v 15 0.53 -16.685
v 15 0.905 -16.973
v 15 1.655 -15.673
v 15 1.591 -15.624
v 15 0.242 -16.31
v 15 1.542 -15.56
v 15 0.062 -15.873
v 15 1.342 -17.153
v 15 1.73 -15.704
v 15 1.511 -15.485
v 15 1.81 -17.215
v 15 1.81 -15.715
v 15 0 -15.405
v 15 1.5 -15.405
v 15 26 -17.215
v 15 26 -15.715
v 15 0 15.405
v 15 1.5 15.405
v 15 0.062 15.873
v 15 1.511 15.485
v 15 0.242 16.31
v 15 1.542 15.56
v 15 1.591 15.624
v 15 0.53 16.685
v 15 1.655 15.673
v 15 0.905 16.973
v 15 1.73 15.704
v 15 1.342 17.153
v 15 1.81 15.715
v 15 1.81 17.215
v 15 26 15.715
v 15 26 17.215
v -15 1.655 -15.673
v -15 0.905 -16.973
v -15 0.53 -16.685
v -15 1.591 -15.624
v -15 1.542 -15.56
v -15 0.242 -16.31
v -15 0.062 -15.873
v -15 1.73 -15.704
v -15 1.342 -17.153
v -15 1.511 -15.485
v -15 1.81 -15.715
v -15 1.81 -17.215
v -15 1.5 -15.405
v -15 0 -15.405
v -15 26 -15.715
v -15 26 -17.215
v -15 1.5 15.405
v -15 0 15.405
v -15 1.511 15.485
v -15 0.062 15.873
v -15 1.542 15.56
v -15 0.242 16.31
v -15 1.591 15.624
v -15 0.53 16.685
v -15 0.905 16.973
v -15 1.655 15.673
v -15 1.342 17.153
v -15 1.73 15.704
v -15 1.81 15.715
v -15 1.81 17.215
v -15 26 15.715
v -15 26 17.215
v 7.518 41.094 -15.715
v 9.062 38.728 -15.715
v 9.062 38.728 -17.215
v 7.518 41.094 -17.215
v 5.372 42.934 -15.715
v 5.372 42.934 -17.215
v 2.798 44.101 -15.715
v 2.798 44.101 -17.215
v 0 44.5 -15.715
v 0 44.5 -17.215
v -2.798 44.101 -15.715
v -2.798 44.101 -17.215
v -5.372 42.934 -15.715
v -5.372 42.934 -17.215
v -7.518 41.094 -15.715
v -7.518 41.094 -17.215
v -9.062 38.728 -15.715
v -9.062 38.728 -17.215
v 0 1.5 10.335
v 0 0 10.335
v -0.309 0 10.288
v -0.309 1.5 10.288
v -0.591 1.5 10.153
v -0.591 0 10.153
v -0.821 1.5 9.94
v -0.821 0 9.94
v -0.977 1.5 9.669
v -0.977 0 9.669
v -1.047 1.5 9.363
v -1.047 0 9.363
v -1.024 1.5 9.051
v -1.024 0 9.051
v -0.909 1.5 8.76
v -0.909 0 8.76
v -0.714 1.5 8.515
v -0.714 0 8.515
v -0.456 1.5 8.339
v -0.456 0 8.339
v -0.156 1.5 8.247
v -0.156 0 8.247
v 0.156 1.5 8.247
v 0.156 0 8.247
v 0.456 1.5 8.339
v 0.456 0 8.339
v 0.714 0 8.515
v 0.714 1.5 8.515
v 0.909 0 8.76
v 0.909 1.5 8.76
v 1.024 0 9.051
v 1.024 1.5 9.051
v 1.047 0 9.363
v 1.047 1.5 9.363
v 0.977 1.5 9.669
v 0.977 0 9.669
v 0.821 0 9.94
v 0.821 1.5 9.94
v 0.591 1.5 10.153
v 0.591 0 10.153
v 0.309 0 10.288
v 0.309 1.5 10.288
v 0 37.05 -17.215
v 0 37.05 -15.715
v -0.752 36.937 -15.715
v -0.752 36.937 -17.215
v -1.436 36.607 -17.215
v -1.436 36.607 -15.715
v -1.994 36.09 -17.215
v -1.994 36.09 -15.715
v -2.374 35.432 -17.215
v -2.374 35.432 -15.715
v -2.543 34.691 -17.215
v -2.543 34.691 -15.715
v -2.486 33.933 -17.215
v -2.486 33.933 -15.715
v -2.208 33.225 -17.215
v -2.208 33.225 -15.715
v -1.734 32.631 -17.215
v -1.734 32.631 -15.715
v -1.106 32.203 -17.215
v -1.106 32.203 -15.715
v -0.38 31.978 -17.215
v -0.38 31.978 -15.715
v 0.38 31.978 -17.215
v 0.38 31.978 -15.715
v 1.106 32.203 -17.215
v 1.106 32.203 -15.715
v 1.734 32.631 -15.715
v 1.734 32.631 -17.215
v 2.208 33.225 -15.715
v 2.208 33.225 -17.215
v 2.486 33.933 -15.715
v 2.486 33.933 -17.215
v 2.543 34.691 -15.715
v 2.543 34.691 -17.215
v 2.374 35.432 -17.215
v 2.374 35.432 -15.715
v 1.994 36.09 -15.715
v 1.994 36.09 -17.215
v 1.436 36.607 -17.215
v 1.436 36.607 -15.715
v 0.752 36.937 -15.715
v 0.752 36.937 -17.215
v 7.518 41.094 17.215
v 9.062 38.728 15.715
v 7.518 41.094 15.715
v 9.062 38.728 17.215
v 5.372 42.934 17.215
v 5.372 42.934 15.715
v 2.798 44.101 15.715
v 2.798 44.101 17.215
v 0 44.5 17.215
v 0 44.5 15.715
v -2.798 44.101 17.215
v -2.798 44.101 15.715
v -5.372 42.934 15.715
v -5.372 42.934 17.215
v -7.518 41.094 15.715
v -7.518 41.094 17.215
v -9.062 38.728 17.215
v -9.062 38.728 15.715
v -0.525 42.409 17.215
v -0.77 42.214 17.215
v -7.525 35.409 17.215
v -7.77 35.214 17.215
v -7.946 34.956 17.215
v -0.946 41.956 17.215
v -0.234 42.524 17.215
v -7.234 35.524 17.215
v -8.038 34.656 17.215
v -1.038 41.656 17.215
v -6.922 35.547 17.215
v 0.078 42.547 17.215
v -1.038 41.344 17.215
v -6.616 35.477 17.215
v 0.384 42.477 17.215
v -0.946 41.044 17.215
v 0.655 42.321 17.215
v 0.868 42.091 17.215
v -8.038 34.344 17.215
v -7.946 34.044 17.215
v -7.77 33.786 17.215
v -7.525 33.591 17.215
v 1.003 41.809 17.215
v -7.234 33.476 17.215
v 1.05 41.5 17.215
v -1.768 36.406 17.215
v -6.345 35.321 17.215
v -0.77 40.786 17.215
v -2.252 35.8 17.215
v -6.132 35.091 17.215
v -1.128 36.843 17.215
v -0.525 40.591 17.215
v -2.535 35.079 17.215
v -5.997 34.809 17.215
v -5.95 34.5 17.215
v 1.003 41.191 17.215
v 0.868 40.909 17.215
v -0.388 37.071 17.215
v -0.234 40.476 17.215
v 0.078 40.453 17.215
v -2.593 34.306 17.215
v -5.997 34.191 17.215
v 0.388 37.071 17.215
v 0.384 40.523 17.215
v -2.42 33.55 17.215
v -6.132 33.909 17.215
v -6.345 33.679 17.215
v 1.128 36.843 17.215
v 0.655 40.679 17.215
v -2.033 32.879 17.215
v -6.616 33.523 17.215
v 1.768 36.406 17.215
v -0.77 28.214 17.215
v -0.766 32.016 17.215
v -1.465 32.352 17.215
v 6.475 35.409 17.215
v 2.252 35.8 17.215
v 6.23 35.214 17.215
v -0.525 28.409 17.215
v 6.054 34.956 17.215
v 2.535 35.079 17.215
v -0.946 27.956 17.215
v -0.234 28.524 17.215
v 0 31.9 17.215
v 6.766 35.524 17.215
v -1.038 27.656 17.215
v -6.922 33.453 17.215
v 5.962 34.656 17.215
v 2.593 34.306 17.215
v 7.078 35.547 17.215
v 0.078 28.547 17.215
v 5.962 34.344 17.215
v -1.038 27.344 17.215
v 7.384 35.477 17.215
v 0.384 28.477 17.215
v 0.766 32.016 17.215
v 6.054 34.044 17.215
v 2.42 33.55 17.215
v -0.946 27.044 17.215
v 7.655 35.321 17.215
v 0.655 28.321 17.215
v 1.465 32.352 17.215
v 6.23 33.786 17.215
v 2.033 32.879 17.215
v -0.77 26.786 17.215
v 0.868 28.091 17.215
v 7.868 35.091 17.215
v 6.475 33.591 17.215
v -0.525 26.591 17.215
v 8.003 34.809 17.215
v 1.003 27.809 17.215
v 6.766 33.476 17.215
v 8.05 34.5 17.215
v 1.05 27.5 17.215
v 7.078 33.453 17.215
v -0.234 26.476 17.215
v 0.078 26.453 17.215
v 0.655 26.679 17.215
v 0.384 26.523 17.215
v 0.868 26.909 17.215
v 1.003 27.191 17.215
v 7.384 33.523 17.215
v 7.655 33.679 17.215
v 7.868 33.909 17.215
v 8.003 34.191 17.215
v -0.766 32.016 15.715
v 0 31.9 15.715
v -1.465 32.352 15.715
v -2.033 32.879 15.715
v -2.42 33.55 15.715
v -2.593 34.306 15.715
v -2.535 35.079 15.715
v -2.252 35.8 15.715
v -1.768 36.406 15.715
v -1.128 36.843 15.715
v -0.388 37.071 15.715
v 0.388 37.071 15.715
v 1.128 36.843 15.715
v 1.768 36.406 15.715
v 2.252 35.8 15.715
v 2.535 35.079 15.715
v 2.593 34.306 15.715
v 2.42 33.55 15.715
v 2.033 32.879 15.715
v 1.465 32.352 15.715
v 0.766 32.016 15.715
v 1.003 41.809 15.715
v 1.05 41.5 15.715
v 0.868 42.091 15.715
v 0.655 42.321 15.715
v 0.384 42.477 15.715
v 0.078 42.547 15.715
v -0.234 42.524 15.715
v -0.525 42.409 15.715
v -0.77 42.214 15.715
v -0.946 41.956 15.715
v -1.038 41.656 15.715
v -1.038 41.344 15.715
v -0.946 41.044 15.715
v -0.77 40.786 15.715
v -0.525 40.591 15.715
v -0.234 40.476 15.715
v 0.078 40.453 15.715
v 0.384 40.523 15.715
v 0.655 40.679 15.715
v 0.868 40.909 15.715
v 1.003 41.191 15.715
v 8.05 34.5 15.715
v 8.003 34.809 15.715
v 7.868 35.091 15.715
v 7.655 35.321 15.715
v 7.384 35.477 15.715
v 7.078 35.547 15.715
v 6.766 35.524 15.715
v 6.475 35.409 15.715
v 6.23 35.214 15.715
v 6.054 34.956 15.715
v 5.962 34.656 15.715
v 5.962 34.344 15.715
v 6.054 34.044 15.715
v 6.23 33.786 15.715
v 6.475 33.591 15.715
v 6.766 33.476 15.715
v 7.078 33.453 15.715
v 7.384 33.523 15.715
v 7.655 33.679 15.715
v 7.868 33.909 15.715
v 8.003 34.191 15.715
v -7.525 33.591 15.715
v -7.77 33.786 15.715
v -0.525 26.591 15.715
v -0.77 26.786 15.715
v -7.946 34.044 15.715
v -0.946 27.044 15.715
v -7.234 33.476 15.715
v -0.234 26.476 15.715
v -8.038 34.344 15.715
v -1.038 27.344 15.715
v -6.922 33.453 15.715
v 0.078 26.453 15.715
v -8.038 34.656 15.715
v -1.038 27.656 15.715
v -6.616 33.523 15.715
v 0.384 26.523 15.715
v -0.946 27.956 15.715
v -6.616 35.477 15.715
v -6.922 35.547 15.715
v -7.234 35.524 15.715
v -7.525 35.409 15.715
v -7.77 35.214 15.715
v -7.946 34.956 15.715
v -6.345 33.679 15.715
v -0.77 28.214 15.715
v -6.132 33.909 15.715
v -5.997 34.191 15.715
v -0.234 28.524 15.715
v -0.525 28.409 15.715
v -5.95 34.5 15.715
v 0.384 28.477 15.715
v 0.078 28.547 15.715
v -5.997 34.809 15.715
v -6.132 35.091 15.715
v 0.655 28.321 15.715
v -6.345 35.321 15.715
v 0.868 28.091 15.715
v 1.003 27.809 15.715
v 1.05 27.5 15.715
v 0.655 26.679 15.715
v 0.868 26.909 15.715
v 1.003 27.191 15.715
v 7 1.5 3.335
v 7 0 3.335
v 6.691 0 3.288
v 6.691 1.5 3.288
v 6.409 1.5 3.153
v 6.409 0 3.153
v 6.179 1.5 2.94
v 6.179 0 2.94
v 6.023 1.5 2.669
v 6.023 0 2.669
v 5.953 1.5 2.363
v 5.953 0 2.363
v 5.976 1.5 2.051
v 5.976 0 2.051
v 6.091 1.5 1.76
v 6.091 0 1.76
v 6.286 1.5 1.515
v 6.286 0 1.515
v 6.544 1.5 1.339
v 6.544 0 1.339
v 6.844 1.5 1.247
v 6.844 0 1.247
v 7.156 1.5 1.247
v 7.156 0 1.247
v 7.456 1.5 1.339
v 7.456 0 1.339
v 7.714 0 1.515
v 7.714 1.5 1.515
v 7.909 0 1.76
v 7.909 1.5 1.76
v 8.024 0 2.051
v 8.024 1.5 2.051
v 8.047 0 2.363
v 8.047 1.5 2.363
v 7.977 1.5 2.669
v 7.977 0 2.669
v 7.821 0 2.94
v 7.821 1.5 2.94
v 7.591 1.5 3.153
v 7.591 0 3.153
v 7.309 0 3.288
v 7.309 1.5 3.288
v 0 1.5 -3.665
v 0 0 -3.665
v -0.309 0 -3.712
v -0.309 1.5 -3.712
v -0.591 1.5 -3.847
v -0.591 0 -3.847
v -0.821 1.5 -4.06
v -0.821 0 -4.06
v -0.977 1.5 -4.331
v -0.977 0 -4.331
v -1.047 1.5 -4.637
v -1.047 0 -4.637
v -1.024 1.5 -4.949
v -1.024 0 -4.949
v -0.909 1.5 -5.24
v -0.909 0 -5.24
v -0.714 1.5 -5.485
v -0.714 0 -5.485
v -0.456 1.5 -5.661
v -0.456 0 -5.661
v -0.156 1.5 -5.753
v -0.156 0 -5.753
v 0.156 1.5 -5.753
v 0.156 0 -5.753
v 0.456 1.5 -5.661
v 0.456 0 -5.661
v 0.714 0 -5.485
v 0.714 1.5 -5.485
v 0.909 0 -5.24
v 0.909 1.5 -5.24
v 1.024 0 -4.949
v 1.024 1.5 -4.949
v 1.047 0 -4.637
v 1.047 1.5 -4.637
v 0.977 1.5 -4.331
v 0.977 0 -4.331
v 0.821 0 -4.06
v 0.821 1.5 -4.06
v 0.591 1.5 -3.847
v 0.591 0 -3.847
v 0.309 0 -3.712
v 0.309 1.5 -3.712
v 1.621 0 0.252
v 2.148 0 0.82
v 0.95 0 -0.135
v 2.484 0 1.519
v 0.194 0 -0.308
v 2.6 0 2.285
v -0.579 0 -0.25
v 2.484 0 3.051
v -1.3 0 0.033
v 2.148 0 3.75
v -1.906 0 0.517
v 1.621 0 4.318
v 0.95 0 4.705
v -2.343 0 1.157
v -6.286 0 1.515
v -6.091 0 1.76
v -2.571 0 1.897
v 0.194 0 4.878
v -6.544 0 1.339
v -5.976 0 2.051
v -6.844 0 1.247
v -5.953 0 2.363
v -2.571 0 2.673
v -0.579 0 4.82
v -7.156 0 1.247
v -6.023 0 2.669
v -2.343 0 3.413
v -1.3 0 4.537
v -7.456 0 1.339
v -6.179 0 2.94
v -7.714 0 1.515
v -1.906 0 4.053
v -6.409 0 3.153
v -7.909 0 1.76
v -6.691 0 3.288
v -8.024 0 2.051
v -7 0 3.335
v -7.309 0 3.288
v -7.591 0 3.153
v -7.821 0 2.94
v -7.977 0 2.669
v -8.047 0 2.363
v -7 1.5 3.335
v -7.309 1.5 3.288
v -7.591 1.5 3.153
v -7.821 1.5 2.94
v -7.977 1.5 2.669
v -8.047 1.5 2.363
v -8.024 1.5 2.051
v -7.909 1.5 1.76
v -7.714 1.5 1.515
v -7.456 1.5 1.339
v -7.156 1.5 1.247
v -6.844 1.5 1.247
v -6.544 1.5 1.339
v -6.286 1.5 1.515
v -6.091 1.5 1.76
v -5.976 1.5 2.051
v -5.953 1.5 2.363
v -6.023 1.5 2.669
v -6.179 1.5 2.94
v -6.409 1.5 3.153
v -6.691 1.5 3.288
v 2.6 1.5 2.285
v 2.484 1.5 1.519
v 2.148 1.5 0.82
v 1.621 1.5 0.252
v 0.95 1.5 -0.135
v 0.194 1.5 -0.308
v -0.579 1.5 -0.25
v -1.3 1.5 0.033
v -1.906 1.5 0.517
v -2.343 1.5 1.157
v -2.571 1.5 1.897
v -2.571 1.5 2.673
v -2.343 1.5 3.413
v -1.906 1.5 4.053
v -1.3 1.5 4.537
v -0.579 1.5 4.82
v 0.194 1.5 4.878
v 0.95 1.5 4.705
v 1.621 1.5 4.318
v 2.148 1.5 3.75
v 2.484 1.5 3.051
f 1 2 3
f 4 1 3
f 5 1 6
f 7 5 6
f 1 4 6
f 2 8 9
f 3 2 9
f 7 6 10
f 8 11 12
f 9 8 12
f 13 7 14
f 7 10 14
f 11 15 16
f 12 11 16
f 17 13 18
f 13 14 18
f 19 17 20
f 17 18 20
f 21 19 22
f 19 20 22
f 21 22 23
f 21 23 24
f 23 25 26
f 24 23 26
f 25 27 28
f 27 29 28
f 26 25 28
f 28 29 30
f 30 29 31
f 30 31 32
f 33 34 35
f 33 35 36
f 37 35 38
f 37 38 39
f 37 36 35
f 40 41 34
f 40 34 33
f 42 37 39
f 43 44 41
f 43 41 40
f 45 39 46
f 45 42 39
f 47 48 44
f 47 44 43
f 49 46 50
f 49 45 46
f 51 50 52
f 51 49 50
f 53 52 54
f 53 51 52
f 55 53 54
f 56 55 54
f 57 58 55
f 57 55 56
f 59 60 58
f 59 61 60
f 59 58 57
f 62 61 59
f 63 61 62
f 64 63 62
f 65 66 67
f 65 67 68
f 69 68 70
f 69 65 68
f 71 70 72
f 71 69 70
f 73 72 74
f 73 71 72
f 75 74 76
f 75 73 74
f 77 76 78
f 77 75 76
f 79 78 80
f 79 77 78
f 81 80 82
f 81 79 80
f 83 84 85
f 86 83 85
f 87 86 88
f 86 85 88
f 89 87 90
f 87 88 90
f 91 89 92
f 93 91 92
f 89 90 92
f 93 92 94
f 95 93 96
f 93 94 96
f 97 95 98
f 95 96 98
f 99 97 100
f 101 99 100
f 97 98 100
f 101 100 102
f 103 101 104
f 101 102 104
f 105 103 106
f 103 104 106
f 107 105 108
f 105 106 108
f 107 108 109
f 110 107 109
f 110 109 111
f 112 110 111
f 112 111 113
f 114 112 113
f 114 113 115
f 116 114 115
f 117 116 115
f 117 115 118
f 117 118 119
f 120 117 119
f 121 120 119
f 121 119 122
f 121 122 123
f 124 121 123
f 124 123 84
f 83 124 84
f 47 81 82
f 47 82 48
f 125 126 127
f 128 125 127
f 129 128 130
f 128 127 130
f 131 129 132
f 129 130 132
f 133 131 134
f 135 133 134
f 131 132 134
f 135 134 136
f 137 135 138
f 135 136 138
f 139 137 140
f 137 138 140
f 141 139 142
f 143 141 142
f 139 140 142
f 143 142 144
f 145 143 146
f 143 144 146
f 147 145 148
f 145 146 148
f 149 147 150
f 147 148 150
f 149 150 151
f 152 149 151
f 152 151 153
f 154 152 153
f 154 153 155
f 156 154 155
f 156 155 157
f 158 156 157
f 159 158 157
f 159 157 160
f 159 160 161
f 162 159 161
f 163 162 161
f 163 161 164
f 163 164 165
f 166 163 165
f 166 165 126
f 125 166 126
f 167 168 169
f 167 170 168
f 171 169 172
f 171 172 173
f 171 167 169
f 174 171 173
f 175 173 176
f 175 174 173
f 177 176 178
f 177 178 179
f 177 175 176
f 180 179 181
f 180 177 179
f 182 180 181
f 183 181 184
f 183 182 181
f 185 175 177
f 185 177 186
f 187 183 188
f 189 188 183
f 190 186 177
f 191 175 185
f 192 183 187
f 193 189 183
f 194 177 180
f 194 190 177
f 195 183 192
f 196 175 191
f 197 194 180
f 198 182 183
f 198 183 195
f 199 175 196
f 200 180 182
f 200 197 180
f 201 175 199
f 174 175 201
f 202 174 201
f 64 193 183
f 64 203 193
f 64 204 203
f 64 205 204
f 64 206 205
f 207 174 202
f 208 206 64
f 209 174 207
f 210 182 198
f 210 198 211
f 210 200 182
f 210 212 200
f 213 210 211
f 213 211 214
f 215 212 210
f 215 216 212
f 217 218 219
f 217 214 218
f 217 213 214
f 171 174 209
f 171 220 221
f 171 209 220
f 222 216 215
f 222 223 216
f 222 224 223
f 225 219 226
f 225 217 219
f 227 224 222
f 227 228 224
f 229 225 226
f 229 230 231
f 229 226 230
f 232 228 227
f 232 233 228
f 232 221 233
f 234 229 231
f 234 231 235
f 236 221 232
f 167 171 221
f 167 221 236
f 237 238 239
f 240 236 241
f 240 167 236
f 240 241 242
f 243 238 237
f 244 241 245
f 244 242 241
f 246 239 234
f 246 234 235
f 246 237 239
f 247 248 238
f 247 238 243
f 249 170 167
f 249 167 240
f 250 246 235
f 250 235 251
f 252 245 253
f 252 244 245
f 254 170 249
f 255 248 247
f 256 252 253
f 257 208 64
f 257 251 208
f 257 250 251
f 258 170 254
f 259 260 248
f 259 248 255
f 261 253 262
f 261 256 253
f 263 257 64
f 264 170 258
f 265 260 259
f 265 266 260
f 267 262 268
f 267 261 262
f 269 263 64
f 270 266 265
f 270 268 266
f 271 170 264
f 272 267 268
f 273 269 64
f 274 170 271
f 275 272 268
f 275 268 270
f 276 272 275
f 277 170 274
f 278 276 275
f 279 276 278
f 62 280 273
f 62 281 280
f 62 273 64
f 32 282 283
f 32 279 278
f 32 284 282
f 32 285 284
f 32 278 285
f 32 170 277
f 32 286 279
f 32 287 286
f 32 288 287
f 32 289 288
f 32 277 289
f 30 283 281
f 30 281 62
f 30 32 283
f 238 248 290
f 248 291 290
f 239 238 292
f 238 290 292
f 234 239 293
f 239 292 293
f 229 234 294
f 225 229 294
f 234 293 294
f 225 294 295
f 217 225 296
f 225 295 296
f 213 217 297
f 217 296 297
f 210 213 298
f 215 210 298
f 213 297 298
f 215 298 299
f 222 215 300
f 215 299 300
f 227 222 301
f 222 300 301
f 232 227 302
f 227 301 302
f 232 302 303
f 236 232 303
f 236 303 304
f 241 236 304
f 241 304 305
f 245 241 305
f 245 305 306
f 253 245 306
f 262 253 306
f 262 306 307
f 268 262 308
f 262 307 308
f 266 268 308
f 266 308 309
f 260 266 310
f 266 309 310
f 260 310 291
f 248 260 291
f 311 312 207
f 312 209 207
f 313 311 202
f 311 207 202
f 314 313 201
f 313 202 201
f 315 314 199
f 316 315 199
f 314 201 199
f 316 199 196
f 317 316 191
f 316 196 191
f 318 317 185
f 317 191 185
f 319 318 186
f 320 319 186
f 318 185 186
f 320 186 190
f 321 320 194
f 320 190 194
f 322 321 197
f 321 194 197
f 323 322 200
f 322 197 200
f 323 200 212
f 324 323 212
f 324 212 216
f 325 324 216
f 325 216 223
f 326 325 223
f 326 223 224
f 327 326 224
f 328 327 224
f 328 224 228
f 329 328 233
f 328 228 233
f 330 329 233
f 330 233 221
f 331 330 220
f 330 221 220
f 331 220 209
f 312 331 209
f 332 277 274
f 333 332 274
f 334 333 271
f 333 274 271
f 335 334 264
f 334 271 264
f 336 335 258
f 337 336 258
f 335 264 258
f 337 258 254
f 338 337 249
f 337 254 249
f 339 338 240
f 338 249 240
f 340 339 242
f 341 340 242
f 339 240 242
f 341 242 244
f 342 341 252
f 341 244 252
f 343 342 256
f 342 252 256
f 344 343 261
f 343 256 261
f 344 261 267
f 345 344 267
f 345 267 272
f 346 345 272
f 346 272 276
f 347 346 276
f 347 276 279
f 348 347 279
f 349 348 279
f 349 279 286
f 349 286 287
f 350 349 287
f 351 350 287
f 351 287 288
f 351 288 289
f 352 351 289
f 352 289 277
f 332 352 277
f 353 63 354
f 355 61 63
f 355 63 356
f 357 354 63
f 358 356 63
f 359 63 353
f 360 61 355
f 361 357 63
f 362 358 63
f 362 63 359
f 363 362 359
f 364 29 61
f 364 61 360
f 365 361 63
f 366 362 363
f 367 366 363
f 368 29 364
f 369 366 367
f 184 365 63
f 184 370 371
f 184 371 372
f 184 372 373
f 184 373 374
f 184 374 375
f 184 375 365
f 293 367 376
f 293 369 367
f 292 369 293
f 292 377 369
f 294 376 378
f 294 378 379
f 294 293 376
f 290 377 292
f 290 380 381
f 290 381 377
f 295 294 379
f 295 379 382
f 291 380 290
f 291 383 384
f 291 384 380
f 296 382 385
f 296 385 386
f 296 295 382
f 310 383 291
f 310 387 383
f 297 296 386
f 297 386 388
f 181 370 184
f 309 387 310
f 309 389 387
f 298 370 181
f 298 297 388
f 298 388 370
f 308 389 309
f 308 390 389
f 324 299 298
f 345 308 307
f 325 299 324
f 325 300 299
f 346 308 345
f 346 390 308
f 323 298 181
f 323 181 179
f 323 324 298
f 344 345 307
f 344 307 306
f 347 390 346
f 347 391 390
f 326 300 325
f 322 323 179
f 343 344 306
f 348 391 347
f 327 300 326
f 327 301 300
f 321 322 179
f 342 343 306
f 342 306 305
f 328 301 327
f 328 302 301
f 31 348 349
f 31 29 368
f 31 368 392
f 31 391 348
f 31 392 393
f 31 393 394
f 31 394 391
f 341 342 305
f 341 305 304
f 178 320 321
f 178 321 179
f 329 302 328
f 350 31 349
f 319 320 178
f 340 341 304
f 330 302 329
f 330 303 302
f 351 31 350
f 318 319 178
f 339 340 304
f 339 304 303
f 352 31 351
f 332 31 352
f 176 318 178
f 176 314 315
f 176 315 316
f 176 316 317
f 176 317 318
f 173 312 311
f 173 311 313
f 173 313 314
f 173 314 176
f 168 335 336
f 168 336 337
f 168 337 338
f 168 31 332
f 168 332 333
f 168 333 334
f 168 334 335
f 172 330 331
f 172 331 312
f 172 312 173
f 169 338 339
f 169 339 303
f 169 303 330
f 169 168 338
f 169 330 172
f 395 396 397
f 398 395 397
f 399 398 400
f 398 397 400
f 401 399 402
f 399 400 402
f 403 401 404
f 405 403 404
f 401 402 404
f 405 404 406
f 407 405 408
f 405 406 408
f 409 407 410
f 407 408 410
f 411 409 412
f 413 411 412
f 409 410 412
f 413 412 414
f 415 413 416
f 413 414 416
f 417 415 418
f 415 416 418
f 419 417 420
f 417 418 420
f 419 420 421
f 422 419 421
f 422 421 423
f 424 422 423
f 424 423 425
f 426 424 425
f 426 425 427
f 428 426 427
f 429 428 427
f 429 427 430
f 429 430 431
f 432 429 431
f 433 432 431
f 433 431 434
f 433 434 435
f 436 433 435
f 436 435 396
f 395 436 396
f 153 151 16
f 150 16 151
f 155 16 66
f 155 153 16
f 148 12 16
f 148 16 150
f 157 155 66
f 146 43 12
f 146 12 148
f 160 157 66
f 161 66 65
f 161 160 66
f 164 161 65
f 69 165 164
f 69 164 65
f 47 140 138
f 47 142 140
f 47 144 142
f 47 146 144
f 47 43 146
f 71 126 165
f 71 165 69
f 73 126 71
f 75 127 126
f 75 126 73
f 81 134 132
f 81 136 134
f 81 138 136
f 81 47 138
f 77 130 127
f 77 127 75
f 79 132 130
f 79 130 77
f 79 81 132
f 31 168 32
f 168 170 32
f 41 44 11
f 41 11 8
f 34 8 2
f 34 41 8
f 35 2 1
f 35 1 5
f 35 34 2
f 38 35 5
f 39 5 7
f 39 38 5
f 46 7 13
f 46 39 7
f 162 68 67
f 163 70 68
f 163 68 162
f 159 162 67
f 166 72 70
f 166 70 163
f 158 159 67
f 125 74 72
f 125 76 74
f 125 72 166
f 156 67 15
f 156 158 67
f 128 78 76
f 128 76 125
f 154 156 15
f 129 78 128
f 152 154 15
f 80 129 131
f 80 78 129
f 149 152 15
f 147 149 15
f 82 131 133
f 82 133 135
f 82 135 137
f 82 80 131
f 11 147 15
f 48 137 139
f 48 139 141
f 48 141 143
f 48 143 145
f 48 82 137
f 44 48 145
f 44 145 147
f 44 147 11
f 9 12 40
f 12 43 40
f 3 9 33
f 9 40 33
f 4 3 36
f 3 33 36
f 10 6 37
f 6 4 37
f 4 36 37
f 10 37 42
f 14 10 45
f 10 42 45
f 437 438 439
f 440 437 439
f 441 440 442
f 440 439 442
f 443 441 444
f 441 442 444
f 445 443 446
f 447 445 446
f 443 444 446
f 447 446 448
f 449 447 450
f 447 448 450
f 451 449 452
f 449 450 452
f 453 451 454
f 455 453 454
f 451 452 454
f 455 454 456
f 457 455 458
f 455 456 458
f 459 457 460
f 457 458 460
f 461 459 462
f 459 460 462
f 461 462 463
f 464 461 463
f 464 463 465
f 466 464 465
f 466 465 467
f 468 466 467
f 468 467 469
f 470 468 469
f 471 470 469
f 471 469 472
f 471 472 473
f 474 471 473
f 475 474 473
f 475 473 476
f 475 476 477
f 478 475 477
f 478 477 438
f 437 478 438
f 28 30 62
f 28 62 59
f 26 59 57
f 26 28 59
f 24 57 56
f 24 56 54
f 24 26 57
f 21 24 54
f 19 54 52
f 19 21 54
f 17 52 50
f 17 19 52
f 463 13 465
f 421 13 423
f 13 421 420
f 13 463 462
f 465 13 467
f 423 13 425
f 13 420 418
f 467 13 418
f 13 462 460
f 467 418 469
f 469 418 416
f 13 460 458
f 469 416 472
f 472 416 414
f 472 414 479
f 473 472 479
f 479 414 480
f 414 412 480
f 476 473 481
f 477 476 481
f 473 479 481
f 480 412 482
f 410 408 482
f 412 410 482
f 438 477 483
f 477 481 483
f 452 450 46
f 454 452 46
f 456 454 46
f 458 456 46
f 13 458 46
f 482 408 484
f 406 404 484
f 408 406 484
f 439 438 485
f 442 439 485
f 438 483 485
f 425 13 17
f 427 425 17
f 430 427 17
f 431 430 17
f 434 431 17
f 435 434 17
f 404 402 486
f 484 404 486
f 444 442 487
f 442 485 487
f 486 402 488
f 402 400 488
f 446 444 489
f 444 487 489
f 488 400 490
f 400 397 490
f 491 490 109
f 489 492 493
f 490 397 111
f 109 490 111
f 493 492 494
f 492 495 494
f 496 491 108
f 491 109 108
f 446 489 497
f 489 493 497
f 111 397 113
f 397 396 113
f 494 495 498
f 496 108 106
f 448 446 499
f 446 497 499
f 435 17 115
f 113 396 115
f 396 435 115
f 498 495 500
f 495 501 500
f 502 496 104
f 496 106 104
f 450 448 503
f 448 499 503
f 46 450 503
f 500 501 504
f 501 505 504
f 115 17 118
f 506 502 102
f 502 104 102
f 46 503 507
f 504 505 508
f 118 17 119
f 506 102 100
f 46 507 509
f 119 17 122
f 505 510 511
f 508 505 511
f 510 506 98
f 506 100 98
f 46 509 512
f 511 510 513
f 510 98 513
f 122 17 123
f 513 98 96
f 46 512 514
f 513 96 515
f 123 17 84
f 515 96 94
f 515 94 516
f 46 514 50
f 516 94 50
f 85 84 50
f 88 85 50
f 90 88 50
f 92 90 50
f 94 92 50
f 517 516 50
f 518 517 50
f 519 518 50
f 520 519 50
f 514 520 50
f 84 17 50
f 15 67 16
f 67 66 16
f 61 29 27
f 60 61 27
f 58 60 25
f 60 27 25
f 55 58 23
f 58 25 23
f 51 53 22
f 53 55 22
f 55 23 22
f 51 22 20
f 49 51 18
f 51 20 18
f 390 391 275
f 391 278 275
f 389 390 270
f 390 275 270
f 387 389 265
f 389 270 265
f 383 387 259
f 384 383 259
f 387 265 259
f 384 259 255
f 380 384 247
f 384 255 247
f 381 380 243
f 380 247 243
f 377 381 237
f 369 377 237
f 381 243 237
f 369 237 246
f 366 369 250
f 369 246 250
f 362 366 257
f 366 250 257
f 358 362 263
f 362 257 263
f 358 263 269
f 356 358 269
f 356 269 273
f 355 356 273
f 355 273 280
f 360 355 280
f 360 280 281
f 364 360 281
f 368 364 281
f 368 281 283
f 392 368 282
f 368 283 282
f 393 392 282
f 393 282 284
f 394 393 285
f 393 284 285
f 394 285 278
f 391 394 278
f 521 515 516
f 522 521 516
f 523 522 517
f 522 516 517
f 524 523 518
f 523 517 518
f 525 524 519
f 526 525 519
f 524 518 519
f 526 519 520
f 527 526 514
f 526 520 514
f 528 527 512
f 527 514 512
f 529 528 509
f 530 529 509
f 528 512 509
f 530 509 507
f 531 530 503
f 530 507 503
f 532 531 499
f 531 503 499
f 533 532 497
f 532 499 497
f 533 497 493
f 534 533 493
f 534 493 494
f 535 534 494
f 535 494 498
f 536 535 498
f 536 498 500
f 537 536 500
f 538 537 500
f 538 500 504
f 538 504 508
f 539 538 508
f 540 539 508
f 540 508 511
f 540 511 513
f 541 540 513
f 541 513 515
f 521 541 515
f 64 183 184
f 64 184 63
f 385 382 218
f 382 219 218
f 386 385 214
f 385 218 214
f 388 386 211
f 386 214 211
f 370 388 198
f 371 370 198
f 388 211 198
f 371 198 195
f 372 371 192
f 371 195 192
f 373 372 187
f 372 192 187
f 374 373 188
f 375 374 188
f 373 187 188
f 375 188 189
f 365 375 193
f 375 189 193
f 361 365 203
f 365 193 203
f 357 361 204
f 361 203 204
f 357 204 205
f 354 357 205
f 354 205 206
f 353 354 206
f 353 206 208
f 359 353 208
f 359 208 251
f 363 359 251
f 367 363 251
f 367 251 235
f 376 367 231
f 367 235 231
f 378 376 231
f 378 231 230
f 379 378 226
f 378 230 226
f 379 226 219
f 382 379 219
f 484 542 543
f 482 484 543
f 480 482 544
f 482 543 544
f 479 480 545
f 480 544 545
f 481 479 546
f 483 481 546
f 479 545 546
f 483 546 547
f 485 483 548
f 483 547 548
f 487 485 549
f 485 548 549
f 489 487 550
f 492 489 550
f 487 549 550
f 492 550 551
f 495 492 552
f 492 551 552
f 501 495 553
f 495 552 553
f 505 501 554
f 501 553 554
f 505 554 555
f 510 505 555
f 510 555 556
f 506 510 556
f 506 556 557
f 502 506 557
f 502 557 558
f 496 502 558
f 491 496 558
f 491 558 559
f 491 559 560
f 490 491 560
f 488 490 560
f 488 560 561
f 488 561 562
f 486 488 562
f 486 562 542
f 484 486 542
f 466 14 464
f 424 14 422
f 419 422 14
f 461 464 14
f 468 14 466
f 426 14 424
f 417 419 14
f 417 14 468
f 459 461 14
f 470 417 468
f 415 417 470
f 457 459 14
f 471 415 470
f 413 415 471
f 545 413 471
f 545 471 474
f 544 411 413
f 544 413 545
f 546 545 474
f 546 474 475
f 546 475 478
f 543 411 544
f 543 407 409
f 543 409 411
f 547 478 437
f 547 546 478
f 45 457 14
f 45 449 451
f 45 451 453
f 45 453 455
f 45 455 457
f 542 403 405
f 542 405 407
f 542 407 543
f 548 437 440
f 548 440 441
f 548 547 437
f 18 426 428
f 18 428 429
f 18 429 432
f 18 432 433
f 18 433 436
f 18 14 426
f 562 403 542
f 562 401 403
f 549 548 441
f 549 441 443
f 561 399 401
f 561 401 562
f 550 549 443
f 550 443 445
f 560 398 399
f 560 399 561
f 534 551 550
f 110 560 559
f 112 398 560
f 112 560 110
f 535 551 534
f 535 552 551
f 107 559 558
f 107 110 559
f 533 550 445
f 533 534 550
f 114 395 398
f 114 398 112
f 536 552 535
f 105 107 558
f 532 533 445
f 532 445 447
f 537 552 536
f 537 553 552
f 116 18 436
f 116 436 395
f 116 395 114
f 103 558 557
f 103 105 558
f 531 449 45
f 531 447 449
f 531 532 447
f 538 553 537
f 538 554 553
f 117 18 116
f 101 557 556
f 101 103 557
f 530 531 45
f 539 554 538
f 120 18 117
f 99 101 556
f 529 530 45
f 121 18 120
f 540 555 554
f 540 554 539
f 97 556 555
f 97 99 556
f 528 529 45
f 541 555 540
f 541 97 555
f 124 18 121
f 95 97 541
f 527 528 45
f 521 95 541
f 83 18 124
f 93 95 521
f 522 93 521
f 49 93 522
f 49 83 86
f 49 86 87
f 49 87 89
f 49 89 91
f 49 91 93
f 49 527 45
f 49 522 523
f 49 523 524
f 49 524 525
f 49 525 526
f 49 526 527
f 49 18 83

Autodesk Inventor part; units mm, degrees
ref_plane "YZ Plane" through (0, 0, 0) normal (1, 0, 0) x (0, 1, 0)
ref_plane "XZ Plane" through (0, 0, 0) normal (0, 1, 0) x (-1, 0, 0)
ref_plane "XY Plane" through (0, 0, 0) normal (0, 0, 1) x (1, 0, 0)
sketch "Sketch1" plane through (0, 0, 0) normal (0, 1, 0) x (-1, 0, 0)
  line L0 (15, -15.715) -> (-15, -15.715)
  line L1 (-15, -15.715) -> (-15, 15.715)
  line L2 (-15, 15.715) -> (15, 15.715)
  line L3 (15, 15.715) -> (15, -15.715)
  point P0 (0, 0)
  dimension "d0" = 30
  dimension "d1" = 31.43
  dimension "d2" = 15
  dimension "d3" = 15.715
extrude "Plate1" add sketch "Sketch1" along normal blind 1.5
sketch "Sketch2" plane through (15, 0, 17.215) normal (0, 0, -1) x (-1, 0, 0)
  line L0 (30, 0) -> (0, 0)
  line L1 (0, 0) -> (0, 45)
  line L2 (0, 45) -> (30, 45)
  line L3 (30, 45) -> (30, 0)
edge flange "Flange1" height 45 angle 90 thickness 1.5 bend radius 0.31 thickness toward (0, 0, -1) relief tear relief width 1.5 relief depth 0.75 edges at (0, 1.5, 15.715) wall of the first edge with corners at (-15, 0, 17.215) (15, 0, 17.215) (15, 45, 17.215) (-15, 45, 17.215)
bend "Bend1"
corner "Corner1"
sketch "Sketch3" plane through (-15, 0, -17.215) normal (0, 0, 1) x (1, 0, 0)
  line L0 (30, 0) -> (0, 0)
  line L1 (0, 0) -> (0, 45)
  line L2 (0, 45) -> (30, 45)
  line L3 (30, 45) -> (30, 0)
edge flange "Flange2" height 45 angle 90 thickness 1.5 bend radius 0.31 thickness toward (0, 0, 1) relief tear relief width 1.5 relief depth 0.75 edges at (0, 1.5, -15.715) wall of the first edge with corners at (15, 0, -17.215) (-15, 0, -17.215) (-15, 45, -17.215) (15, 45, -17.215)
bend "Bend2"
corner "Corner2"
sketch "Sketch6" plane through (-15, 45, 17.215) normal (0, 0, 1) x (1, 0, 0)
  circle A0 centre (15, -10.5) radius 10
  line L0 (5, -10.5) -> (5, 9.5)
  line L1 (5, 9.5) -> (25, 9.5)
  line L2 (25, 9.5) -> (25, -10.5)
  line L3 (0, 0) -> (30, 0) projected
  line L4 (0, -43.19) -> (0, 0) projected
  line L5 (5.9376, -6.2723) -> (0, -19)
  line L6 (24.0624, -6.2723) -> (30, -19)
  line L7 (30, -45) -> (0, -45) projected
  line L8 (30, 0) -> (30, -43.19) projected
  point P0 (15, -45)
  point P1 (25, 0)
  point P2 (5, -8.2822)
  point P3 (5, 0)
  point P4 (30, -19)
  point P5 (25, -8.2822)
  dimension "d39" = 34.5
  dimension "d40" = 20
  dimension "d41" = 20
  dimension "d42" = 20
  dimension "d43" = 20
  dimension "d45" = 15
  dimension "d48" = 26
  dimension "d49" = 26
  dimension "d50" = 0
extrude "Extrusion1" cut sketch "Sketch6" against normal blind 50 contours A0 L5 L0 L3 L2 L6 | L2 L3 L8 L6 | L5 L4 L3 L0
sketch "Sketch7" plane through (-15, 1.81, 17.215) normal (0, 0, 1) x (1, 0, 0)
  arc A0 (24.0624, 36.9177) -> (5.9376, 36.9177) centre (15, 32.69) ccw projected
  circle A1 centre (22, 32.69) radius 1.05
  circle A2 centre (15, 39.69) radius 1.05
  circle A3 centre (8, 32.69) radius 1.05
  circle A4 centre (15, 25.69) radius 1.05
  point P0 (15, -1.81)
  dimension "d51" = 7
  dimension "d52" = 2.1
  dimension "d55" = 360
extrude "Extrusion2" cut sketch "Sketch7" against normal blind 20
sketch "Sketch8" plane through (0, 1.5, 0) normal (0, 1, 0) x (1, 0, 0)
  line L0 (15, 15.715) -> (9.0624, 15.715) projected
  line L1 (9.0624, 15.715) -> (-9.0624, 15.715) projected
  line L2 (-9.0624, 15.715) -> (-15, 15.715) projected
  line L3 (-15, 15.715) -> (15, 15.715) projected
  circle A0 centre (0, -2.285) radius 2.6
  point P0 (0, 0)
  point P1 (7, -2.285)
  point P2 (0, 4.715)
  point P3 (-7, -2.285)
  point P4 (0, -9.285)
  dimension "d59" = 18
  dimension "d60" = 0
  dimension "d61" = 5.2
  dimension "d62" = 7
  dimension "d63" = 0
  dimension "d66" = 360
extrude "Extrusion3" cut sketch "Sketch8" against normal blind 10
sketch "Sketch9" plane through (0, 1.5, 0) normal (0, 1, 0) x (1, 0, 0)
  point P0 (0, 0)
hole "Hole3" at (0, 1.5, -4.715) at (7, 1.5, 2.285) at (-7, 1.5, 2.285) at (0, 1.5, 9.285) direction (0, -1, 0) diameter 2.1 depth 1.5
hole "Hole4" at (0, 34.5, 17.215) direction (0, 0, -1) diameter 5.2 depth 1.5 clearance for "Hex Head Bolt" size "M5" standard "Ansi Metric M Profile"
sketch "Sketch10" plane through (15, 1.81, -17.215) normal (0, 0, -1) x (-1, 0, 0)
  circle A0 centre (15, 32.69) radius 2.6 projected
  point P0 (15, -1.81)
hole "Hole5" at (0, 34.5, -17.215) direction (0, 0, 1) diameter 5.1 depth 1.5 clearance for "Hex Head Bolt" size "M5" standard "Ansi Metric M Profile"
equation "\"d75\" = Thickness"
equation "\"d82\" = Thickness"
equation "\"d89\" = Thickness"
equation "\"d4\" = Thickness"
equation "\"d5\" = BendReliefWidth"
equation "\"d6\" = BendReliefDepth"
equation "\"d7\" = MinimumRemnant"
equation "\"d8\" = TransitionRadius"
equation "\"d11\" = BendRadius"
equation "\"d12\" = CornerReliefSize"
equation "\"d13\" = GapSize"
equation "\"d14\" = JacobiRadiusSize"
equation "\"d15\" = BendReliefWidth"
equation "\"d16\" = BendReliefDepth"
equation "\"d17\" = MinimumRemnant"
equation "\"d18\" = TransitionRadius"
equation "\"d21\" = BendRadius"
equation "\"d22\" = CornerReliefSize"
equation "\"d23\" = GapSize"
equation "\"d24\" = JacobiRadiusSize"
equation "\"BendReliefWidth\" = Thickness"
equation "\"BendReliefDepth\" = 0.5 * Thickness"
equation "\"CornerReliefSize\" = 4 * Thickness"
equation "\"MinimumRemnant\" = 2 * Thickness"
equation "\"TransitionRadius\" = BendRadius"
equation "\"JacobiRadiusSize\" = BendRadius"
equation "\"GapSize\" = Thickness"
equation "\"Thickness\" = 1.5"
equation "\"BendRadius\" = 0.31"
properties part number "axis_7_top_frame" material "Aluminum 6061-AHC"
